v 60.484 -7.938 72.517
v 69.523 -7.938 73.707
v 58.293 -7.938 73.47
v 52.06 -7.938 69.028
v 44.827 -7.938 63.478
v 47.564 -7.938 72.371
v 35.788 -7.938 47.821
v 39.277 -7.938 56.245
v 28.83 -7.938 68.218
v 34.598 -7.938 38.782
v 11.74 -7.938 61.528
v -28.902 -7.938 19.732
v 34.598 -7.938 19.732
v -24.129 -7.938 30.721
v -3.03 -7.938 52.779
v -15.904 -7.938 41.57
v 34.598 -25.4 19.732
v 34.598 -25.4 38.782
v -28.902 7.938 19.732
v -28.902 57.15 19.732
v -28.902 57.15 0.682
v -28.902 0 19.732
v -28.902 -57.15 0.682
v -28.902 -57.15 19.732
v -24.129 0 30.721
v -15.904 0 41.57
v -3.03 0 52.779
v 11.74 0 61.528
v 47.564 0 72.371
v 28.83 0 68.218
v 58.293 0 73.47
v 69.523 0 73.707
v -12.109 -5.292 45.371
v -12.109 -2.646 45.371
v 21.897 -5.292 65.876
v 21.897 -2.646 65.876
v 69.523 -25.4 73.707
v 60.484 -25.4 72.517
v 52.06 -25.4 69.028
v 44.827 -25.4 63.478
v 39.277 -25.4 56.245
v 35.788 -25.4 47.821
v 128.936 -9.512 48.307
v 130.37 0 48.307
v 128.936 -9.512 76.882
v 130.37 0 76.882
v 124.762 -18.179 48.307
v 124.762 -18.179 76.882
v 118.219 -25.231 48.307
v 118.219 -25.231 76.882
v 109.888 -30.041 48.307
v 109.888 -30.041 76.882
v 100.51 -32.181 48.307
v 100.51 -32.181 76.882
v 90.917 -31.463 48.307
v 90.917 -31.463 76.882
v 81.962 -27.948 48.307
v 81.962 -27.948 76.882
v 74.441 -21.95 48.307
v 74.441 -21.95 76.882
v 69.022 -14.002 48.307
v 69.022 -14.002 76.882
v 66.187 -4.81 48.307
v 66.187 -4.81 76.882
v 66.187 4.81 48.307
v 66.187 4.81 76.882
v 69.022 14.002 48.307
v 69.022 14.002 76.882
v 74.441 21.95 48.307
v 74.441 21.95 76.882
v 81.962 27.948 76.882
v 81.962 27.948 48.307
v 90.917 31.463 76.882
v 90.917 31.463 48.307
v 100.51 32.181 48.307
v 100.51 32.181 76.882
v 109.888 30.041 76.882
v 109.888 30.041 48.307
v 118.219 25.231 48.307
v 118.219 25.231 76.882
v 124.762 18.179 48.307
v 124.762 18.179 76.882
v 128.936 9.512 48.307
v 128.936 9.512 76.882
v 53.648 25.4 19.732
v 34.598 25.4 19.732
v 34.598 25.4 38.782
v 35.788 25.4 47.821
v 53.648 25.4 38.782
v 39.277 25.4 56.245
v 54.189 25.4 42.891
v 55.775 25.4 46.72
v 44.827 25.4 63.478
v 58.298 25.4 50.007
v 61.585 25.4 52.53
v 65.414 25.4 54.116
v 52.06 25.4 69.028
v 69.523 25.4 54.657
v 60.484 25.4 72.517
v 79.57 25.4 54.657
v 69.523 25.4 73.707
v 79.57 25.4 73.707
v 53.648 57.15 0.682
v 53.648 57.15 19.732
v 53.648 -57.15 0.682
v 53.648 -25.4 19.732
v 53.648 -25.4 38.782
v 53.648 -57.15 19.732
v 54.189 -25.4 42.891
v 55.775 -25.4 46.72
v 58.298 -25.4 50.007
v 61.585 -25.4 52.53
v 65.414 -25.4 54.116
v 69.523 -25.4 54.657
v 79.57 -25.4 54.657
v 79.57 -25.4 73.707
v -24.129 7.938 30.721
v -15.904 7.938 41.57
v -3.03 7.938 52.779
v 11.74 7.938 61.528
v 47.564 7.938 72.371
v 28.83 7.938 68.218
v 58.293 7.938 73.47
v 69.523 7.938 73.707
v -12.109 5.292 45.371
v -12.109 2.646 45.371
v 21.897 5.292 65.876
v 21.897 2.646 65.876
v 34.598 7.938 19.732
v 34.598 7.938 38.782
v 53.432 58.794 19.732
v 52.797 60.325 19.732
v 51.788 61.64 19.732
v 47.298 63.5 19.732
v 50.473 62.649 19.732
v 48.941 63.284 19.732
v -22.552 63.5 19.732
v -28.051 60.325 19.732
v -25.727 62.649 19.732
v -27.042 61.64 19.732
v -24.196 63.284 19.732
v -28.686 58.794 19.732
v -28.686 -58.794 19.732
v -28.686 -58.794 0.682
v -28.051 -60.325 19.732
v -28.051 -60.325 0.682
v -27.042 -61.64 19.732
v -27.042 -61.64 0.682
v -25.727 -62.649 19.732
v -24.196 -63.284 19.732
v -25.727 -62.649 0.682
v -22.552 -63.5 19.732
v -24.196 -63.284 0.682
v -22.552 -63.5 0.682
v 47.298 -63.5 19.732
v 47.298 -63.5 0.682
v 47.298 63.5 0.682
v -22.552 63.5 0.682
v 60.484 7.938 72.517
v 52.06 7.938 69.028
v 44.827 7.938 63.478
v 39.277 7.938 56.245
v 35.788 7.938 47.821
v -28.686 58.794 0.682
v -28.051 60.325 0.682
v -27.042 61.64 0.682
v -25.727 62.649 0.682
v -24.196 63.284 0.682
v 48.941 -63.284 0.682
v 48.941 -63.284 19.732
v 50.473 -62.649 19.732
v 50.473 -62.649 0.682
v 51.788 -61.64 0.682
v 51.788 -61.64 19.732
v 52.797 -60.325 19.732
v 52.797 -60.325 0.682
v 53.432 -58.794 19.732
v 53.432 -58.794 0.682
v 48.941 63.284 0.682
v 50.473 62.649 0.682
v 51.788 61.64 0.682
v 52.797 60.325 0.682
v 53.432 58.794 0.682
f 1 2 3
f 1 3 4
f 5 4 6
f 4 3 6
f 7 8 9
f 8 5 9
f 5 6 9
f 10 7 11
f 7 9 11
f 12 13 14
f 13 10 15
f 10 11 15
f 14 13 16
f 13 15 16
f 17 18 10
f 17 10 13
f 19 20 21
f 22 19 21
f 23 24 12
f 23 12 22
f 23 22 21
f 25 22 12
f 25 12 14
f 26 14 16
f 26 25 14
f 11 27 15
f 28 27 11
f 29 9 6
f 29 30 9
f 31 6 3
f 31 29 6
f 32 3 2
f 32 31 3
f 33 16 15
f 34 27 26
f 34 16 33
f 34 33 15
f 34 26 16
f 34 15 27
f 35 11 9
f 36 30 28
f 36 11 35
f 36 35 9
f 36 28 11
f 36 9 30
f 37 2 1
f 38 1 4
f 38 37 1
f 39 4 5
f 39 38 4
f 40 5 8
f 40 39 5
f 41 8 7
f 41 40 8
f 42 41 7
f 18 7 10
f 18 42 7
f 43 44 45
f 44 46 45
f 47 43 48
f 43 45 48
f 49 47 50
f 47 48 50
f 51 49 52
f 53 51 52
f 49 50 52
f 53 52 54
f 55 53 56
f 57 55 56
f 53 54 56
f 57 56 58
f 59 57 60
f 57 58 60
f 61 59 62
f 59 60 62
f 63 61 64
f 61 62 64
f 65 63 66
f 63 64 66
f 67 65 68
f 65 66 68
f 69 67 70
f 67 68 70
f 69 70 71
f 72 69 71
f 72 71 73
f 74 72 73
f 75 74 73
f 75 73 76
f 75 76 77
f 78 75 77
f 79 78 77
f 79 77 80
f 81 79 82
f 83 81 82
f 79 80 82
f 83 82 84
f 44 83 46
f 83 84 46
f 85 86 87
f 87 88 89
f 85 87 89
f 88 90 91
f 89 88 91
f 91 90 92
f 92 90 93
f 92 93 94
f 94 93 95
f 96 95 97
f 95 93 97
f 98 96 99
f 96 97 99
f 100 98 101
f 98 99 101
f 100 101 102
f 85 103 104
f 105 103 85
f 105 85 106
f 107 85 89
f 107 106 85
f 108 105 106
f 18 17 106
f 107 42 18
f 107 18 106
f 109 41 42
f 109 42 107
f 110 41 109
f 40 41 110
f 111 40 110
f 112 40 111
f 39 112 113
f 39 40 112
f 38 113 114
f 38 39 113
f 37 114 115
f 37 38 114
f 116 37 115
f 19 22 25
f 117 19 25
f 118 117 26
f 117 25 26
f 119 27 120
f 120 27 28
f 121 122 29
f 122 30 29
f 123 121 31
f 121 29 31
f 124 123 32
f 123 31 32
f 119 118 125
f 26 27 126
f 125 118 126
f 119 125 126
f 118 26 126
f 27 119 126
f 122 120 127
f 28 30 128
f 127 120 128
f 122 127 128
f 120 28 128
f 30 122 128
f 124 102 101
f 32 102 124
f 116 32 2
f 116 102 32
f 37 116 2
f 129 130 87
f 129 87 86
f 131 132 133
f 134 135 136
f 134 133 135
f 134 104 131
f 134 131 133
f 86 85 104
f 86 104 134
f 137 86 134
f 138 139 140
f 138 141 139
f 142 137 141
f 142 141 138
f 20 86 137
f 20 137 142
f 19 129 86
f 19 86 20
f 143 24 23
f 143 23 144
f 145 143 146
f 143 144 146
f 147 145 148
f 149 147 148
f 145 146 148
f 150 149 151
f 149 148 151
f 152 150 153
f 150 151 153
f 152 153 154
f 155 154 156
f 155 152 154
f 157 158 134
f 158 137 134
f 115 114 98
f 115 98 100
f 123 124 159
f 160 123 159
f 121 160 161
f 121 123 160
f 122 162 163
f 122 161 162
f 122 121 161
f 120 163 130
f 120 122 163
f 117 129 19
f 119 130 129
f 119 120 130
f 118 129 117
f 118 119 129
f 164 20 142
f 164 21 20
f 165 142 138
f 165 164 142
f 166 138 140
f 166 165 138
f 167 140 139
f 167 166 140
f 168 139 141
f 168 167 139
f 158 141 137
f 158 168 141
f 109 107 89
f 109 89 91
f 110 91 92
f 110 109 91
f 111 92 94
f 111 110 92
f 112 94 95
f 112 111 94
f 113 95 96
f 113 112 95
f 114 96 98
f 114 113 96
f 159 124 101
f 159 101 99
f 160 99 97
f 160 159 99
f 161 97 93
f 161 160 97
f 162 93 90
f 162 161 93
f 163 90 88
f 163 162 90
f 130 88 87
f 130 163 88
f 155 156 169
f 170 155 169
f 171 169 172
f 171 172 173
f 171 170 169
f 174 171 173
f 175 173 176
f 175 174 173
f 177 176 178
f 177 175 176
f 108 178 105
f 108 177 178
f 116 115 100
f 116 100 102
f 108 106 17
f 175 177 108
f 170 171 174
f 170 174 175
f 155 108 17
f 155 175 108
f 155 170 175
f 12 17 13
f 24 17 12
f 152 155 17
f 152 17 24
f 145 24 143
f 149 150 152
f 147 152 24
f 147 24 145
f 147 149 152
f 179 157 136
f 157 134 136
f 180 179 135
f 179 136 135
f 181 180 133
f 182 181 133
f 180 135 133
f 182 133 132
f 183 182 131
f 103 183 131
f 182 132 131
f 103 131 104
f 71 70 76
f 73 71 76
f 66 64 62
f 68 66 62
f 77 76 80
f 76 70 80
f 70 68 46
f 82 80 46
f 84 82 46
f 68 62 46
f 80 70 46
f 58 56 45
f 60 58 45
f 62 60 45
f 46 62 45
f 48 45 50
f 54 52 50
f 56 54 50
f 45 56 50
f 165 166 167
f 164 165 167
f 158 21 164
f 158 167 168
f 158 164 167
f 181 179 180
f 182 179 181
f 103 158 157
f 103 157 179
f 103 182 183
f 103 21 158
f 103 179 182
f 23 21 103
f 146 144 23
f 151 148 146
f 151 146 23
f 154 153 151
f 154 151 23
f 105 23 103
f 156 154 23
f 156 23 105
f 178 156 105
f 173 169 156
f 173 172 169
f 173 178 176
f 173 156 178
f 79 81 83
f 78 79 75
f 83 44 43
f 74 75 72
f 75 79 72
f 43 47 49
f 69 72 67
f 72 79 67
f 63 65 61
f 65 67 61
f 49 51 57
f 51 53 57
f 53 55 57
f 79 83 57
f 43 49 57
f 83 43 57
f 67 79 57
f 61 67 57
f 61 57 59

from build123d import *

# Parameters (mm, degrees)
F1_DEPTH = 63.5
F2_DEPTH = 25.4
F3_DEPTH = 7.9375
F5_R     = 6.35


# Not quite as in the source:
# - a feature names something its author has since deleted; it is built from what else it names


with BuildPart() as f1:
    # F0 (on Front) → F1 (new body, symmetric)
    with BuildSketch(Plane.XZ):
        Polygon((34.5979332924, 19.7320799329), (-28.9020667076, 19.7320799329), (-28.9020667076, 0.6820799329), (53.6479332924, 0.6820799329), (53.6479332924, 19.7320799329), align=None)
    extrude(amount=F1_DEPTH, both=True)

    # F0 (on Front) → F2 (join, symmetric)
    with BuildSketch(Plane.XZ):
        with BuildLine():
            Line((34.5979332924, 38.7820799329), (34.5979332924, 19.7320799329))
            Line((34.5979332924, 19.7320799329), (53.6479332924, 19.7320799329))
            Line((53.6479332924, 19.7320799329), (53.6479332924, 38.7820799329))
            ThreePointArc((53.6479332924, 38.7820799329), (58.2976131411, 50.0074000842), (69.5229332924, 54.6570799329))
            Line((69.5229332924, 54.6570799329), (79.5695575002, 54.6570799329))
            Line((79.5695575002, 54.6570799329), (79.5695575002, 73.7070799329))
            Line((79.5695575002, 73.7070799329), (69.5229332924, 73.7070799329))
            ThreePointArc((69.5229332924, 73.7070799329), (44.8272289594, 63.4777842658), (34.5979332924, 38.7820799329))
        make_face()
    extrude(amount=F2_DEPTH, both=True)

    # F0 (on Front) → F3 (join, symmetric)
    with BuildSketch(Plane.XZ):
        with BuildLine():
            add(Edge.make_bspline(
                [(-28.9020667076, 19.7320799329), (-21.9128355384, 45.4243458807), (16.2842553109, 74.7262239456), (69.5229332924, 73.7070799329)],
                knots=[0, 0, 0, 0, 112.2532015134, 112.2532015134, 112.2532015134, 112.2532015134], degree=3))
            Line((-28.9020667076, 19.7320799329), (34.5979332924, 19.7320799329))
            Line((34.5979332924, 19.7320799329), (34.5979332924, 38.7820799329))
            ThreePointArc((34.5979332924, 38.7820799329), (44.8272289594, 63.4777842658), (69.5229332924, 73.7070799329))
        make_face()
    extrude(amount=F3_DEPTH, both=True)

    # F5
    f5_edges = [f1.edges().sort_by_distance(p)[0] for p in [
        (-28.902067, -63.5, 10.20708),
        (53.647933, -63.5, 10.20708),
        (-28.902067, 63.5, 10.20708),
        (53.647933, 63.5, 10.20708),
    ]]
    fillet(f5_edges, radius=F5_R)


with BuildPart() as f4:
    # F0 (on Front) → F4 (revolve)
    with BuildSketch(Plane.XZ):
        Polygon((98.0979332924, 76.8820799329), (98.0979332924, 73.7070799329), (98.0979332924, 54.6570799329), (98.0979332924, 48.3070799329), (130.3695575002, 48.3070799329), (130.3695575002, 76.8820799329), align=None)
    revolve(axis=Axis((98.0979332924, 0, 62.5945799329), (0, 0, -1)))


solid = Compound([f1.part, f4.part])
